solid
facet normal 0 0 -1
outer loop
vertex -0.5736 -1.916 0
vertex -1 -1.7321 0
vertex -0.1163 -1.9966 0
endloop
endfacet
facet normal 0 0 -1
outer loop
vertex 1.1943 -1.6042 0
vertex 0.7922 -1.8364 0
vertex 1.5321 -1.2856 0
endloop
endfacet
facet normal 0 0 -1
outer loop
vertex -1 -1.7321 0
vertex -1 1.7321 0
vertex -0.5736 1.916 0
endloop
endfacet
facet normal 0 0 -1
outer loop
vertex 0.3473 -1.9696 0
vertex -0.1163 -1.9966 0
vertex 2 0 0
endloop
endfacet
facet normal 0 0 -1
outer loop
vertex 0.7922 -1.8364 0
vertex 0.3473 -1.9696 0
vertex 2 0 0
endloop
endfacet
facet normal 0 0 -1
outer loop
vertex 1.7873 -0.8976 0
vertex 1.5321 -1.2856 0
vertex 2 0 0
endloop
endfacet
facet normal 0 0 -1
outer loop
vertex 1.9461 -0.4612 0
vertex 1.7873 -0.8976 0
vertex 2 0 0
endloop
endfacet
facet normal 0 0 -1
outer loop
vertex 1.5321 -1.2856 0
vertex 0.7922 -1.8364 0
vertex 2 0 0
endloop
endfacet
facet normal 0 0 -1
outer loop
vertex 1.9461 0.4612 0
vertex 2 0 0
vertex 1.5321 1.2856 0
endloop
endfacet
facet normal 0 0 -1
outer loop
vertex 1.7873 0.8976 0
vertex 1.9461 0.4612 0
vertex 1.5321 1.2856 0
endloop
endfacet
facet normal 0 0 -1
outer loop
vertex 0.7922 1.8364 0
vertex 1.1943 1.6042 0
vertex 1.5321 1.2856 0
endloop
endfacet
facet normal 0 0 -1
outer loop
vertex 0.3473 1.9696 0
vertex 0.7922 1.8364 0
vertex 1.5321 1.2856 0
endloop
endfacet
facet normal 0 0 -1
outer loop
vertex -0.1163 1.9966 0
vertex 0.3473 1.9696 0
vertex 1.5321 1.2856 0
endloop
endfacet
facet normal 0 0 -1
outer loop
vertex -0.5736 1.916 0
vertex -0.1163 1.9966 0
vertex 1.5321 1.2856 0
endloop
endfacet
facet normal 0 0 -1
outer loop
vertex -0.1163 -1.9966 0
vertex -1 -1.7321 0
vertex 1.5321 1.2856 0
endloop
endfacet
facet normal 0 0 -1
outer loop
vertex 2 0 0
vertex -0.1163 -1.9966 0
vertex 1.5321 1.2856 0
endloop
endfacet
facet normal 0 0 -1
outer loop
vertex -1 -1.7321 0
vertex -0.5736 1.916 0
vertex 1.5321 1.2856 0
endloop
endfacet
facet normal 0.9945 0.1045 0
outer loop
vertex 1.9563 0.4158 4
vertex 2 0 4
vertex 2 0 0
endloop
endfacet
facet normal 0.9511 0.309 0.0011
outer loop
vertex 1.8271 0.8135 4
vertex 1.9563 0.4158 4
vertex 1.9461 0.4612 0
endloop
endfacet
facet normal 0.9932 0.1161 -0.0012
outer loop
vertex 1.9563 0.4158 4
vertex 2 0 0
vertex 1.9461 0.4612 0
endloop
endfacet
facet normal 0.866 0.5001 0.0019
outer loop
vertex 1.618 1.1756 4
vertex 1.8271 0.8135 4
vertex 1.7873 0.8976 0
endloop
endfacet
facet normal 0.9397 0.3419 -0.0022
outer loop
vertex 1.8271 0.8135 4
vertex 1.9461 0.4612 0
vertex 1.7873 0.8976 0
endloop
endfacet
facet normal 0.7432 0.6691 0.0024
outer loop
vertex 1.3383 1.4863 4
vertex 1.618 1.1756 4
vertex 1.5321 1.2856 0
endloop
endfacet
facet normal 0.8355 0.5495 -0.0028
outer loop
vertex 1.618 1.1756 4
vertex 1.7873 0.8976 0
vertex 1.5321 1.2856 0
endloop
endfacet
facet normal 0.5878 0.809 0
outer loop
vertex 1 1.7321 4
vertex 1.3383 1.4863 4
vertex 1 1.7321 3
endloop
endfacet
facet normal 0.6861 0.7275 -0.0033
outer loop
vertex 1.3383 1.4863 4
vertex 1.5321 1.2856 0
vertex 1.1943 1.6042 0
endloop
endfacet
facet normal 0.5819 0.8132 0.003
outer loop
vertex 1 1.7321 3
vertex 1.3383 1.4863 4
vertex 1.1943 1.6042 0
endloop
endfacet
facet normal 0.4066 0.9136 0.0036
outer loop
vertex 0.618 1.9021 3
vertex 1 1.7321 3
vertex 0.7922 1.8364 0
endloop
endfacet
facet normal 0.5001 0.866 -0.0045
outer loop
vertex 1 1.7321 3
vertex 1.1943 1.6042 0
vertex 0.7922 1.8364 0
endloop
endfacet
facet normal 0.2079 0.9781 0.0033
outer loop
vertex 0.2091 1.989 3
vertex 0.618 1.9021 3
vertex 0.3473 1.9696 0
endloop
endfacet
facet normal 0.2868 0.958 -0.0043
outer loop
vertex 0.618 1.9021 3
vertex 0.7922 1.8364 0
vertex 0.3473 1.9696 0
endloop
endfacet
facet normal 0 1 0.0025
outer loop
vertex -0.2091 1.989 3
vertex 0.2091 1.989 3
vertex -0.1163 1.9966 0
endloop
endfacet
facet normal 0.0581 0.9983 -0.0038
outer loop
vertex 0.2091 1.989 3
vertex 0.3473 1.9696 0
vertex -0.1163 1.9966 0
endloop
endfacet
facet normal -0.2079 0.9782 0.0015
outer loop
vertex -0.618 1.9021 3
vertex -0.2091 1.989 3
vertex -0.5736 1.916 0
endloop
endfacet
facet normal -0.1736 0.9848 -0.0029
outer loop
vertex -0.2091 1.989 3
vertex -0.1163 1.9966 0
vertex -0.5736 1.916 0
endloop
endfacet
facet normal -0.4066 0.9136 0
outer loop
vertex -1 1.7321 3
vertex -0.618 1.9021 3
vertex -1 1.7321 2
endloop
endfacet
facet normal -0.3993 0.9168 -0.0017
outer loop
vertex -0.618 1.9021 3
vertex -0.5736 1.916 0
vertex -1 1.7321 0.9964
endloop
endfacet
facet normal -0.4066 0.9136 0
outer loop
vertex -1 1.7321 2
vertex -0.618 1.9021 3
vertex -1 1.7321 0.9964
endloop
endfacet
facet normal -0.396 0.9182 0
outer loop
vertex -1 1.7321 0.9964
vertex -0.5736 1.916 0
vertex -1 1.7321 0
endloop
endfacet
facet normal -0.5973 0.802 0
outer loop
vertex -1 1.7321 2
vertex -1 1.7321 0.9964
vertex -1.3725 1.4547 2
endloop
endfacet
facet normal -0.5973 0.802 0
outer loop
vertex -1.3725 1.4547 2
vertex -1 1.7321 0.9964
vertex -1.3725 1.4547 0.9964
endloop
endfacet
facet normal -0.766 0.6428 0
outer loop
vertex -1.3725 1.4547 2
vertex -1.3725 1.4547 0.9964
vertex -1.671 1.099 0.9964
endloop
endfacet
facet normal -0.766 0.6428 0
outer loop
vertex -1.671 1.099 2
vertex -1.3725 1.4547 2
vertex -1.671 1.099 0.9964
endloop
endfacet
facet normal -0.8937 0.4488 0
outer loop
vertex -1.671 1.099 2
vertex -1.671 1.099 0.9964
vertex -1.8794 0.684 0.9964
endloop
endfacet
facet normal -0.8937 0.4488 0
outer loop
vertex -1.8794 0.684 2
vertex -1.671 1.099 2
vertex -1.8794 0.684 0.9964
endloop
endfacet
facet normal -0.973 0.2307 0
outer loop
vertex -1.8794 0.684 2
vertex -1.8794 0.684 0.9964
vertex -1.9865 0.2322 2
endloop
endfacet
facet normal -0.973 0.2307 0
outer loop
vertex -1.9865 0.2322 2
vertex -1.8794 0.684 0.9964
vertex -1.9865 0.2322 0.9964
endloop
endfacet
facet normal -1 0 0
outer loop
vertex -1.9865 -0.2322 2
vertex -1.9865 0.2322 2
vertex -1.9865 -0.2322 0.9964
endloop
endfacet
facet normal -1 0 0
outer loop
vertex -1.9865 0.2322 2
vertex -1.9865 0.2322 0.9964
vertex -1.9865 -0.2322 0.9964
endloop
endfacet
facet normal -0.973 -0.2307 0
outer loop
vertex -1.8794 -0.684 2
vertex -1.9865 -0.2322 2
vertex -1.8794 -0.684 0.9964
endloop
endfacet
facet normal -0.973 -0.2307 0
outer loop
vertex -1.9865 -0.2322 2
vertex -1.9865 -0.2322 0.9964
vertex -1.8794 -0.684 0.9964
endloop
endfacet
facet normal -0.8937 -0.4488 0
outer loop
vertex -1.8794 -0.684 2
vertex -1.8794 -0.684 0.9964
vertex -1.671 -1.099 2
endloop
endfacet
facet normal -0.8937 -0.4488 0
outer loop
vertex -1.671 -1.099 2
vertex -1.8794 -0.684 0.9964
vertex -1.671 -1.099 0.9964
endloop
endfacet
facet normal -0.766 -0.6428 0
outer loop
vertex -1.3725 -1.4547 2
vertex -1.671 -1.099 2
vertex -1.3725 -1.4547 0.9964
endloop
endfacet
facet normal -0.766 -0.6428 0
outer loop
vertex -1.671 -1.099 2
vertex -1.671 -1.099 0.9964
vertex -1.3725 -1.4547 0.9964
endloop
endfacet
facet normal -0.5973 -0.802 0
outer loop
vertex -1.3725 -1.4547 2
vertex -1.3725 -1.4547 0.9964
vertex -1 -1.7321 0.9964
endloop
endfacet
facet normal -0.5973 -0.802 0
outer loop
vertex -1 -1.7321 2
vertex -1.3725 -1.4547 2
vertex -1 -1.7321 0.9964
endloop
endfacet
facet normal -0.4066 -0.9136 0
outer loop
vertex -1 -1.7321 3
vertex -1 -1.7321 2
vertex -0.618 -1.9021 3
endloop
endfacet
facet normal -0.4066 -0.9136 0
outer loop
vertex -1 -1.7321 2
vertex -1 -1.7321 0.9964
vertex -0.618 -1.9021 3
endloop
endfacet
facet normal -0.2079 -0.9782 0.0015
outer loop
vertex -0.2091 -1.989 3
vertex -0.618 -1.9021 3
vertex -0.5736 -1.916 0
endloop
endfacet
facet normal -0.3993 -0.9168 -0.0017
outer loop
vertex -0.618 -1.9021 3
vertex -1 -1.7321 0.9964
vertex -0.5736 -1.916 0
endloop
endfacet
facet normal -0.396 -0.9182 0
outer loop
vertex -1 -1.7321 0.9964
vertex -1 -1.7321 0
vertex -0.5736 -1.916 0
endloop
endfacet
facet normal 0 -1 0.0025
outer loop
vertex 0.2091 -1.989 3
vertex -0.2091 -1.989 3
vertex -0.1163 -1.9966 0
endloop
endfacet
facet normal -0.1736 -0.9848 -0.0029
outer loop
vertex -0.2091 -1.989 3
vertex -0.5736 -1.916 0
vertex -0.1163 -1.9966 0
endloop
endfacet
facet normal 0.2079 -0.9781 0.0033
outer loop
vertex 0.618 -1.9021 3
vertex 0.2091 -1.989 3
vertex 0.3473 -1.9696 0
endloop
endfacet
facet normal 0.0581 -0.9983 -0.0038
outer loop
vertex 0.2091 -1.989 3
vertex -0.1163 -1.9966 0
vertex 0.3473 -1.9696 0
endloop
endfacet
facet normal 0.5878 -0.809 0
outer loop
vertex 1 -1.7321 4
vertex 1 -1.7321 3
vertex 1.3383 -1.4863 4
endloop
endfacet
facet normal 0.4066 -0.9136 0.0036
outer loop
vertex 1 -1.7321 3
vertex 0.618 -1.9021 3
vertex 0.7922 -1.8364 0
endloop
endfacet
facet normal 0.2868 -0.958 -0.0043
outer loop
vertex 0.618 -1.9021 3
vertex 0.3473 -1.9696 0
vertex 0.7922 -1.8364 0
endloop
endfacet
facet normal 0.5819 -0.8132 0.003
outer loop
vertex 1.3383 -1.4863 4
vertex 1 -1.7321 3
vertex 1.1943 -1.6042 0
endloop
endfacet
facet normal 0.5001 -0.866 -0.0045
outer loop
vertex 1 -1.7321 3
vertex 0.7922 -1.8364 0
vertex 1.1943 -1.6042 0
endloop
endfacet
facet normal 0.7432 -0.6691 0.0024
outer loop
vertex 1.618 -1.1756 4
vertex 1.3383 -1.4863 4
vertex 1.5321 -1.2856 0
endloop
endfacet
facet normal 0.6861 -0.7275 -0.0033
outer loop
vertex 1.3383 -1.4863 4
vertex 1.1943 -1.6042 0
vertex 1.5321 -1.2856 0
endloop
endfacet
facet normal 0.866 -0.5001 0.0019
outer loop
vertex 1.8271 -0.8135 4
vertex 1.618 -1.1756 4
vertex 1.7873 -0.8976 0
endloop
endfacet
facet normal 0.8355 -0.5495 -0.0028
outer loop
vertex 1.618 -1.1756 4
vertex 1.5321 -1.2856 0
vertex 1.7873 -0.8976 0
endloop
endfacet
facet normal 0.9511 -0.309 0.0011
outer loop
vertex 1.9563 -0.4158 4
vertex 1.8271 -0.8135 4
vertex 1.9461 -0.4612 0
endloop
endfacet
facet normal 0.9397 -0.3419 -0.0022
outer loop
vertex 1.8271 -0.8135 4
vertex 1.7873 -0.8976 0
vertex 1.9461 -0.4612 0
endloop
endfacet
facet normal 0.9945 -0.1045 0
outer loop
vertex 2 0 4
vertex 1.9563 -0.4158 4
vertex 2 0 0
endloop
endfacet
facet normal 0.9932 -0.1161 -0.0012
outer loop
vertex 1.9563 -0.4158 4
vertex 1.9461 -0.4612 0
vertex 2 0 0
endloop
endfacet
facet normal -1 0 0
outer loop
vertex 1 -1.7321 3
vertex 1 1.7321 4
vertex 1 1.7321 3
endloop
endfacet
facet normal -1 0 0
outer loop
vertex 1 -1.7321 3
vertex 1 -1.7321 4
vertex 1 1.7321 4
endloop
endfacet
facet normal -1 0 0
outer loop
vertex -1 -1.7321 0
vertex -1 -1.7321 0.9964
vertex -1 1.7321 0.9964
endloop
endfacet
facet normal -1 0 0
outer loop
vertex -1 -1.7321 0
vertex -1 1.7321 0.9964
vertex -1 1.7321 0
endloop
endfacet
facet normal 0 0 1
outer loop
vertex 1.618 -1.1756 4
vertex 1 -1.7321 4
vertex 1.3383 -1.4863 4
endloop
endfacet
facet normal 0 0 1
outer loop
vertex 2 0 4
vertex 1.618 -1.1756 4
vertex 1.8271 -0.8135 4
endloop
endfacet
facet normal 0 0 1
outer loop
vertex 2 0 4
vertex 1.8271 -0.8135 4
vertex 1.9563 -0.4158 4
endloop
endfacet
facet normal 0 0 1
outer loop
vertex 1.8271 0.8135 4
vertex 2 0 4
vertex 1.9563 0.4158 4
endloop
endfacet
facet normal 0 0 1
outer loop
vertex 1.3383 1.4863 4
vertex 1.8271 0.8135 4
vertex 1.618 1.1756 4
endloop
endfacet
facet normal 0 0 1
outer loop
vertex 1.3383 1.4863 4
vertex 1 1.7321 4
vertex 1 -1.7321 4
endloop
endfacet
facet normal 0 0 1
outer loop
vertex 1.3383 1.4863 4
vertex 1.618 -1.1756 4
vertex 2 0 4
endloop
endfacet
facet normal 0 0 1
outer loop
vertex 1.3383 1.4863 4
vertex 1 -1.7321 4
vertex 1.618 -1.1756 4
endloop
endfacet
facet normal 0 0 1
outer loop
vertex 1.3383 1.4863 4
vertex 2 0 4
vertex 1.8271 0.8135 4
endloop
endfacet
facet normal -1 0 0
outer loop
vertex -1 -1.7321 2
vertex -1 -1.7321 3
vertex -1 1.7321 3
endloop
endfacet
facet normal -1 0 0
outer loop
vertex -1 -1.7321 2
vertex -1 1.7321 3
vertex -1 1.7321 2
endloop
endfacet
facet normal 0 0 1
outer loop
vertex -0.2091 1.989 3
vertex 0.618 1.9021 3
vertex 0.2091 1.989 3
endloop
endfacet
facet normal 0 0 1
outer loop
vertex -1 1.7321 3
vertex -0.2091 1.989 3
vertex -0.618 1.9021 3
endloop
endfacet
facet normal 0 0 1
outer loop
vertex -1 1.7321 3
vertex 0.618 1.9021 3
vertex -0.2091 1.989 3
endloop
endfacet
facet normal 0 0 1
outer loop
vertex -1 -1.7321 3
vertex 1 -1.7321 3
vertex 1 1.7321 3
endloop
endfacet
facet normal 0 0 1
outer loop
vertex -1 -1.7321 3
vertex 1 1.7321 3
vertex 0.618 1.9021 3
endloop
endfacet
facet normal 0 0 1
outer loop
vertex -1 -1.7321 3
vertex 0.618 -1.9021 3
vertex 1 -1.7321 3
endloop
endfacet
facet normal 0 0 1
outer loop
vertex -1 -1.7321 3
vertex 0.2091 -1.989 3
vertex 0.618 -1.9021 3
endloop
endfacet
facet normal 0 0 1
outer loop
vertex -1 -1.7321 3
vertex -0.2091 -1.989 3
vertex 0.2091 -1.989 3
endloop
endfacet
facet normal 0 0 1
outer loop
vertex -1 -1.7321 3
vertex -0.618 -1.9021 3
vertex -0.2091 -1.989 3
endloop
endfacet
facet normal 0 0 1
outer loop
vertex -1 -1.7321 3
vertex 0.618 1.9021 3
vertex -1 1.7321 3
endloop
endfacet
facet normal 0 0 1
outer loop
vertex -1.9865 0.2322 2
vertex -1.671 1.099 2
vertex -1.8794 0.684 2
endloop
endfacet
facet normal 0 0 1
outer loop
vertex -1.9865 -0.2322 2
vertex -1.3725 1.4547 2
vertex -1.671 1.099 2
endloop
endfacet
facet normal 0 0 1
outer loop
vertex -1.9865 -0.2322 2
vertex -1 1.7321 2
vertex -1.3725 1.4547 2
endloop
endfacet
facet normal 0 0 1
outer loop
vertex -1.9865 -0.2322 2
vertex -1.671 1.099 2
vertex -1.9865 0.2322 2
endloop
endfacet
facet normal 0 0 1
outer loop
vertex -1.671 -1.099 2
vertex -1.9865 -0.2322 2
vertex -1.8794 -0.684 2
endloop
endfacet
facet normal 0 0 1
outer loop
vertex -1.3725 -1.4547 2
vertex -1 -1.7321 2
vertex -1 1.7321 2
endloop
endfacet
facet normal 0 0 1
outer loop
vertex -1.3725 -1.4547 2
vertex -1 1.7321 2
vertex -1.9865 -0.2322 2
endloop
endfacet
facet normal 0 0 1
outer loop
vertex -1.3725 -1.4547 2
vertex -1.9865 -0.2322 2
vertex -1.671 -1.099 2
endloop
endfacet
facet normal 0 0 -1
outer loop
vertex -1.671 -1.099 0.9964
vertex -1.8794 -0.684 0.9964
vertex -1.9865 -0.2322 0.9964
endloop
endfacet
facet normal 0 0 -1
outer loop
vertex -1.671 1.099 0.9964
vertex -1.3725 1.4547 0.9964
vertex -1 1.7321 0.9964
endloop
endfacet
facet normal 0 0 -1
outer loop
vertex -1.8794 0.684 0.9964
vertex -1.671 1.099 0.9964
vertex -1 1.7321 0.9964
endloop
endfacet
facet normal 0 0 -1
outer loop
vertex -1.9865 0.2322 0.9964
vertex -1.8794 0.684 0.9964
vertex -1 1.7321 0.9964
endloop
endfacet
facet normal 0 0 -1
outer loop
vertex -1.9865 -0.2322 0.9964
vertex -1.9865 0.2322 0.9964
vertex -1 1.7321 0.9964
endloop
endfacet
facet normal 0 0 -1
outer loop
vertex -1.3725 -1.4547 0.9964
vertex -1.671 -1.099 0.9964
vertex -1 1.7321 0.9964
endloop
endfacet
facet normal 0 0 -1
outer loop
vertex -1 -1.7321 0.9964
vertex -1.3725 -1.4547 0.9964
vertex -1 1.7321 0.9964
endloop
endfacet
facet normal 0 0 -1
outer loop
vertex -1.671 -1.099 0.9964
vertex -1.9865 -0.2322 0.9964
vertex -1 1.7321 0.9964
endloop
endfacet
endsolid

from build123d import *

# Parameters (mm, degrees)
SKETCH1_R           = 2
BOSS_EXTRUDE1_DEPTH = 4
SKETCH2_W           = 1
SKETCH2_H           = 0.996424707
CUT_EXTRUDE2_DEPTH  = 2


with BuildPart() as part:
    # Sketch1 → Boss-Extrude1 (new body)
    with BuildSketch(Plane.XY):
        Circle(SKETCH1_R)
    extrude(amount=BOSS_EXTRUDE1_DEPTH)

    # Sketch2 → Cut-Extrude2 (cut, symmetric)
    with BuildSketch(Plane(origin=(0, 0, 0), x_dir=(1, 0, 0), z_dir=(0, 1, 0))):
        Polygon((-1, -5), (1, -5), (1, -3), (-1, -3), (-1, -2), (-2, -2), (-2, -3), (-2, -5), align=None)
        with Locations((-1.5, -0.498212354)):
            Rectangle(SKETCH2_W, SKETCH2_H)
    extrude(amount=CUT_EXTRUDE2_DEPTH, both=True, mode=Mode.SUBTRACT)


solid = part.part
